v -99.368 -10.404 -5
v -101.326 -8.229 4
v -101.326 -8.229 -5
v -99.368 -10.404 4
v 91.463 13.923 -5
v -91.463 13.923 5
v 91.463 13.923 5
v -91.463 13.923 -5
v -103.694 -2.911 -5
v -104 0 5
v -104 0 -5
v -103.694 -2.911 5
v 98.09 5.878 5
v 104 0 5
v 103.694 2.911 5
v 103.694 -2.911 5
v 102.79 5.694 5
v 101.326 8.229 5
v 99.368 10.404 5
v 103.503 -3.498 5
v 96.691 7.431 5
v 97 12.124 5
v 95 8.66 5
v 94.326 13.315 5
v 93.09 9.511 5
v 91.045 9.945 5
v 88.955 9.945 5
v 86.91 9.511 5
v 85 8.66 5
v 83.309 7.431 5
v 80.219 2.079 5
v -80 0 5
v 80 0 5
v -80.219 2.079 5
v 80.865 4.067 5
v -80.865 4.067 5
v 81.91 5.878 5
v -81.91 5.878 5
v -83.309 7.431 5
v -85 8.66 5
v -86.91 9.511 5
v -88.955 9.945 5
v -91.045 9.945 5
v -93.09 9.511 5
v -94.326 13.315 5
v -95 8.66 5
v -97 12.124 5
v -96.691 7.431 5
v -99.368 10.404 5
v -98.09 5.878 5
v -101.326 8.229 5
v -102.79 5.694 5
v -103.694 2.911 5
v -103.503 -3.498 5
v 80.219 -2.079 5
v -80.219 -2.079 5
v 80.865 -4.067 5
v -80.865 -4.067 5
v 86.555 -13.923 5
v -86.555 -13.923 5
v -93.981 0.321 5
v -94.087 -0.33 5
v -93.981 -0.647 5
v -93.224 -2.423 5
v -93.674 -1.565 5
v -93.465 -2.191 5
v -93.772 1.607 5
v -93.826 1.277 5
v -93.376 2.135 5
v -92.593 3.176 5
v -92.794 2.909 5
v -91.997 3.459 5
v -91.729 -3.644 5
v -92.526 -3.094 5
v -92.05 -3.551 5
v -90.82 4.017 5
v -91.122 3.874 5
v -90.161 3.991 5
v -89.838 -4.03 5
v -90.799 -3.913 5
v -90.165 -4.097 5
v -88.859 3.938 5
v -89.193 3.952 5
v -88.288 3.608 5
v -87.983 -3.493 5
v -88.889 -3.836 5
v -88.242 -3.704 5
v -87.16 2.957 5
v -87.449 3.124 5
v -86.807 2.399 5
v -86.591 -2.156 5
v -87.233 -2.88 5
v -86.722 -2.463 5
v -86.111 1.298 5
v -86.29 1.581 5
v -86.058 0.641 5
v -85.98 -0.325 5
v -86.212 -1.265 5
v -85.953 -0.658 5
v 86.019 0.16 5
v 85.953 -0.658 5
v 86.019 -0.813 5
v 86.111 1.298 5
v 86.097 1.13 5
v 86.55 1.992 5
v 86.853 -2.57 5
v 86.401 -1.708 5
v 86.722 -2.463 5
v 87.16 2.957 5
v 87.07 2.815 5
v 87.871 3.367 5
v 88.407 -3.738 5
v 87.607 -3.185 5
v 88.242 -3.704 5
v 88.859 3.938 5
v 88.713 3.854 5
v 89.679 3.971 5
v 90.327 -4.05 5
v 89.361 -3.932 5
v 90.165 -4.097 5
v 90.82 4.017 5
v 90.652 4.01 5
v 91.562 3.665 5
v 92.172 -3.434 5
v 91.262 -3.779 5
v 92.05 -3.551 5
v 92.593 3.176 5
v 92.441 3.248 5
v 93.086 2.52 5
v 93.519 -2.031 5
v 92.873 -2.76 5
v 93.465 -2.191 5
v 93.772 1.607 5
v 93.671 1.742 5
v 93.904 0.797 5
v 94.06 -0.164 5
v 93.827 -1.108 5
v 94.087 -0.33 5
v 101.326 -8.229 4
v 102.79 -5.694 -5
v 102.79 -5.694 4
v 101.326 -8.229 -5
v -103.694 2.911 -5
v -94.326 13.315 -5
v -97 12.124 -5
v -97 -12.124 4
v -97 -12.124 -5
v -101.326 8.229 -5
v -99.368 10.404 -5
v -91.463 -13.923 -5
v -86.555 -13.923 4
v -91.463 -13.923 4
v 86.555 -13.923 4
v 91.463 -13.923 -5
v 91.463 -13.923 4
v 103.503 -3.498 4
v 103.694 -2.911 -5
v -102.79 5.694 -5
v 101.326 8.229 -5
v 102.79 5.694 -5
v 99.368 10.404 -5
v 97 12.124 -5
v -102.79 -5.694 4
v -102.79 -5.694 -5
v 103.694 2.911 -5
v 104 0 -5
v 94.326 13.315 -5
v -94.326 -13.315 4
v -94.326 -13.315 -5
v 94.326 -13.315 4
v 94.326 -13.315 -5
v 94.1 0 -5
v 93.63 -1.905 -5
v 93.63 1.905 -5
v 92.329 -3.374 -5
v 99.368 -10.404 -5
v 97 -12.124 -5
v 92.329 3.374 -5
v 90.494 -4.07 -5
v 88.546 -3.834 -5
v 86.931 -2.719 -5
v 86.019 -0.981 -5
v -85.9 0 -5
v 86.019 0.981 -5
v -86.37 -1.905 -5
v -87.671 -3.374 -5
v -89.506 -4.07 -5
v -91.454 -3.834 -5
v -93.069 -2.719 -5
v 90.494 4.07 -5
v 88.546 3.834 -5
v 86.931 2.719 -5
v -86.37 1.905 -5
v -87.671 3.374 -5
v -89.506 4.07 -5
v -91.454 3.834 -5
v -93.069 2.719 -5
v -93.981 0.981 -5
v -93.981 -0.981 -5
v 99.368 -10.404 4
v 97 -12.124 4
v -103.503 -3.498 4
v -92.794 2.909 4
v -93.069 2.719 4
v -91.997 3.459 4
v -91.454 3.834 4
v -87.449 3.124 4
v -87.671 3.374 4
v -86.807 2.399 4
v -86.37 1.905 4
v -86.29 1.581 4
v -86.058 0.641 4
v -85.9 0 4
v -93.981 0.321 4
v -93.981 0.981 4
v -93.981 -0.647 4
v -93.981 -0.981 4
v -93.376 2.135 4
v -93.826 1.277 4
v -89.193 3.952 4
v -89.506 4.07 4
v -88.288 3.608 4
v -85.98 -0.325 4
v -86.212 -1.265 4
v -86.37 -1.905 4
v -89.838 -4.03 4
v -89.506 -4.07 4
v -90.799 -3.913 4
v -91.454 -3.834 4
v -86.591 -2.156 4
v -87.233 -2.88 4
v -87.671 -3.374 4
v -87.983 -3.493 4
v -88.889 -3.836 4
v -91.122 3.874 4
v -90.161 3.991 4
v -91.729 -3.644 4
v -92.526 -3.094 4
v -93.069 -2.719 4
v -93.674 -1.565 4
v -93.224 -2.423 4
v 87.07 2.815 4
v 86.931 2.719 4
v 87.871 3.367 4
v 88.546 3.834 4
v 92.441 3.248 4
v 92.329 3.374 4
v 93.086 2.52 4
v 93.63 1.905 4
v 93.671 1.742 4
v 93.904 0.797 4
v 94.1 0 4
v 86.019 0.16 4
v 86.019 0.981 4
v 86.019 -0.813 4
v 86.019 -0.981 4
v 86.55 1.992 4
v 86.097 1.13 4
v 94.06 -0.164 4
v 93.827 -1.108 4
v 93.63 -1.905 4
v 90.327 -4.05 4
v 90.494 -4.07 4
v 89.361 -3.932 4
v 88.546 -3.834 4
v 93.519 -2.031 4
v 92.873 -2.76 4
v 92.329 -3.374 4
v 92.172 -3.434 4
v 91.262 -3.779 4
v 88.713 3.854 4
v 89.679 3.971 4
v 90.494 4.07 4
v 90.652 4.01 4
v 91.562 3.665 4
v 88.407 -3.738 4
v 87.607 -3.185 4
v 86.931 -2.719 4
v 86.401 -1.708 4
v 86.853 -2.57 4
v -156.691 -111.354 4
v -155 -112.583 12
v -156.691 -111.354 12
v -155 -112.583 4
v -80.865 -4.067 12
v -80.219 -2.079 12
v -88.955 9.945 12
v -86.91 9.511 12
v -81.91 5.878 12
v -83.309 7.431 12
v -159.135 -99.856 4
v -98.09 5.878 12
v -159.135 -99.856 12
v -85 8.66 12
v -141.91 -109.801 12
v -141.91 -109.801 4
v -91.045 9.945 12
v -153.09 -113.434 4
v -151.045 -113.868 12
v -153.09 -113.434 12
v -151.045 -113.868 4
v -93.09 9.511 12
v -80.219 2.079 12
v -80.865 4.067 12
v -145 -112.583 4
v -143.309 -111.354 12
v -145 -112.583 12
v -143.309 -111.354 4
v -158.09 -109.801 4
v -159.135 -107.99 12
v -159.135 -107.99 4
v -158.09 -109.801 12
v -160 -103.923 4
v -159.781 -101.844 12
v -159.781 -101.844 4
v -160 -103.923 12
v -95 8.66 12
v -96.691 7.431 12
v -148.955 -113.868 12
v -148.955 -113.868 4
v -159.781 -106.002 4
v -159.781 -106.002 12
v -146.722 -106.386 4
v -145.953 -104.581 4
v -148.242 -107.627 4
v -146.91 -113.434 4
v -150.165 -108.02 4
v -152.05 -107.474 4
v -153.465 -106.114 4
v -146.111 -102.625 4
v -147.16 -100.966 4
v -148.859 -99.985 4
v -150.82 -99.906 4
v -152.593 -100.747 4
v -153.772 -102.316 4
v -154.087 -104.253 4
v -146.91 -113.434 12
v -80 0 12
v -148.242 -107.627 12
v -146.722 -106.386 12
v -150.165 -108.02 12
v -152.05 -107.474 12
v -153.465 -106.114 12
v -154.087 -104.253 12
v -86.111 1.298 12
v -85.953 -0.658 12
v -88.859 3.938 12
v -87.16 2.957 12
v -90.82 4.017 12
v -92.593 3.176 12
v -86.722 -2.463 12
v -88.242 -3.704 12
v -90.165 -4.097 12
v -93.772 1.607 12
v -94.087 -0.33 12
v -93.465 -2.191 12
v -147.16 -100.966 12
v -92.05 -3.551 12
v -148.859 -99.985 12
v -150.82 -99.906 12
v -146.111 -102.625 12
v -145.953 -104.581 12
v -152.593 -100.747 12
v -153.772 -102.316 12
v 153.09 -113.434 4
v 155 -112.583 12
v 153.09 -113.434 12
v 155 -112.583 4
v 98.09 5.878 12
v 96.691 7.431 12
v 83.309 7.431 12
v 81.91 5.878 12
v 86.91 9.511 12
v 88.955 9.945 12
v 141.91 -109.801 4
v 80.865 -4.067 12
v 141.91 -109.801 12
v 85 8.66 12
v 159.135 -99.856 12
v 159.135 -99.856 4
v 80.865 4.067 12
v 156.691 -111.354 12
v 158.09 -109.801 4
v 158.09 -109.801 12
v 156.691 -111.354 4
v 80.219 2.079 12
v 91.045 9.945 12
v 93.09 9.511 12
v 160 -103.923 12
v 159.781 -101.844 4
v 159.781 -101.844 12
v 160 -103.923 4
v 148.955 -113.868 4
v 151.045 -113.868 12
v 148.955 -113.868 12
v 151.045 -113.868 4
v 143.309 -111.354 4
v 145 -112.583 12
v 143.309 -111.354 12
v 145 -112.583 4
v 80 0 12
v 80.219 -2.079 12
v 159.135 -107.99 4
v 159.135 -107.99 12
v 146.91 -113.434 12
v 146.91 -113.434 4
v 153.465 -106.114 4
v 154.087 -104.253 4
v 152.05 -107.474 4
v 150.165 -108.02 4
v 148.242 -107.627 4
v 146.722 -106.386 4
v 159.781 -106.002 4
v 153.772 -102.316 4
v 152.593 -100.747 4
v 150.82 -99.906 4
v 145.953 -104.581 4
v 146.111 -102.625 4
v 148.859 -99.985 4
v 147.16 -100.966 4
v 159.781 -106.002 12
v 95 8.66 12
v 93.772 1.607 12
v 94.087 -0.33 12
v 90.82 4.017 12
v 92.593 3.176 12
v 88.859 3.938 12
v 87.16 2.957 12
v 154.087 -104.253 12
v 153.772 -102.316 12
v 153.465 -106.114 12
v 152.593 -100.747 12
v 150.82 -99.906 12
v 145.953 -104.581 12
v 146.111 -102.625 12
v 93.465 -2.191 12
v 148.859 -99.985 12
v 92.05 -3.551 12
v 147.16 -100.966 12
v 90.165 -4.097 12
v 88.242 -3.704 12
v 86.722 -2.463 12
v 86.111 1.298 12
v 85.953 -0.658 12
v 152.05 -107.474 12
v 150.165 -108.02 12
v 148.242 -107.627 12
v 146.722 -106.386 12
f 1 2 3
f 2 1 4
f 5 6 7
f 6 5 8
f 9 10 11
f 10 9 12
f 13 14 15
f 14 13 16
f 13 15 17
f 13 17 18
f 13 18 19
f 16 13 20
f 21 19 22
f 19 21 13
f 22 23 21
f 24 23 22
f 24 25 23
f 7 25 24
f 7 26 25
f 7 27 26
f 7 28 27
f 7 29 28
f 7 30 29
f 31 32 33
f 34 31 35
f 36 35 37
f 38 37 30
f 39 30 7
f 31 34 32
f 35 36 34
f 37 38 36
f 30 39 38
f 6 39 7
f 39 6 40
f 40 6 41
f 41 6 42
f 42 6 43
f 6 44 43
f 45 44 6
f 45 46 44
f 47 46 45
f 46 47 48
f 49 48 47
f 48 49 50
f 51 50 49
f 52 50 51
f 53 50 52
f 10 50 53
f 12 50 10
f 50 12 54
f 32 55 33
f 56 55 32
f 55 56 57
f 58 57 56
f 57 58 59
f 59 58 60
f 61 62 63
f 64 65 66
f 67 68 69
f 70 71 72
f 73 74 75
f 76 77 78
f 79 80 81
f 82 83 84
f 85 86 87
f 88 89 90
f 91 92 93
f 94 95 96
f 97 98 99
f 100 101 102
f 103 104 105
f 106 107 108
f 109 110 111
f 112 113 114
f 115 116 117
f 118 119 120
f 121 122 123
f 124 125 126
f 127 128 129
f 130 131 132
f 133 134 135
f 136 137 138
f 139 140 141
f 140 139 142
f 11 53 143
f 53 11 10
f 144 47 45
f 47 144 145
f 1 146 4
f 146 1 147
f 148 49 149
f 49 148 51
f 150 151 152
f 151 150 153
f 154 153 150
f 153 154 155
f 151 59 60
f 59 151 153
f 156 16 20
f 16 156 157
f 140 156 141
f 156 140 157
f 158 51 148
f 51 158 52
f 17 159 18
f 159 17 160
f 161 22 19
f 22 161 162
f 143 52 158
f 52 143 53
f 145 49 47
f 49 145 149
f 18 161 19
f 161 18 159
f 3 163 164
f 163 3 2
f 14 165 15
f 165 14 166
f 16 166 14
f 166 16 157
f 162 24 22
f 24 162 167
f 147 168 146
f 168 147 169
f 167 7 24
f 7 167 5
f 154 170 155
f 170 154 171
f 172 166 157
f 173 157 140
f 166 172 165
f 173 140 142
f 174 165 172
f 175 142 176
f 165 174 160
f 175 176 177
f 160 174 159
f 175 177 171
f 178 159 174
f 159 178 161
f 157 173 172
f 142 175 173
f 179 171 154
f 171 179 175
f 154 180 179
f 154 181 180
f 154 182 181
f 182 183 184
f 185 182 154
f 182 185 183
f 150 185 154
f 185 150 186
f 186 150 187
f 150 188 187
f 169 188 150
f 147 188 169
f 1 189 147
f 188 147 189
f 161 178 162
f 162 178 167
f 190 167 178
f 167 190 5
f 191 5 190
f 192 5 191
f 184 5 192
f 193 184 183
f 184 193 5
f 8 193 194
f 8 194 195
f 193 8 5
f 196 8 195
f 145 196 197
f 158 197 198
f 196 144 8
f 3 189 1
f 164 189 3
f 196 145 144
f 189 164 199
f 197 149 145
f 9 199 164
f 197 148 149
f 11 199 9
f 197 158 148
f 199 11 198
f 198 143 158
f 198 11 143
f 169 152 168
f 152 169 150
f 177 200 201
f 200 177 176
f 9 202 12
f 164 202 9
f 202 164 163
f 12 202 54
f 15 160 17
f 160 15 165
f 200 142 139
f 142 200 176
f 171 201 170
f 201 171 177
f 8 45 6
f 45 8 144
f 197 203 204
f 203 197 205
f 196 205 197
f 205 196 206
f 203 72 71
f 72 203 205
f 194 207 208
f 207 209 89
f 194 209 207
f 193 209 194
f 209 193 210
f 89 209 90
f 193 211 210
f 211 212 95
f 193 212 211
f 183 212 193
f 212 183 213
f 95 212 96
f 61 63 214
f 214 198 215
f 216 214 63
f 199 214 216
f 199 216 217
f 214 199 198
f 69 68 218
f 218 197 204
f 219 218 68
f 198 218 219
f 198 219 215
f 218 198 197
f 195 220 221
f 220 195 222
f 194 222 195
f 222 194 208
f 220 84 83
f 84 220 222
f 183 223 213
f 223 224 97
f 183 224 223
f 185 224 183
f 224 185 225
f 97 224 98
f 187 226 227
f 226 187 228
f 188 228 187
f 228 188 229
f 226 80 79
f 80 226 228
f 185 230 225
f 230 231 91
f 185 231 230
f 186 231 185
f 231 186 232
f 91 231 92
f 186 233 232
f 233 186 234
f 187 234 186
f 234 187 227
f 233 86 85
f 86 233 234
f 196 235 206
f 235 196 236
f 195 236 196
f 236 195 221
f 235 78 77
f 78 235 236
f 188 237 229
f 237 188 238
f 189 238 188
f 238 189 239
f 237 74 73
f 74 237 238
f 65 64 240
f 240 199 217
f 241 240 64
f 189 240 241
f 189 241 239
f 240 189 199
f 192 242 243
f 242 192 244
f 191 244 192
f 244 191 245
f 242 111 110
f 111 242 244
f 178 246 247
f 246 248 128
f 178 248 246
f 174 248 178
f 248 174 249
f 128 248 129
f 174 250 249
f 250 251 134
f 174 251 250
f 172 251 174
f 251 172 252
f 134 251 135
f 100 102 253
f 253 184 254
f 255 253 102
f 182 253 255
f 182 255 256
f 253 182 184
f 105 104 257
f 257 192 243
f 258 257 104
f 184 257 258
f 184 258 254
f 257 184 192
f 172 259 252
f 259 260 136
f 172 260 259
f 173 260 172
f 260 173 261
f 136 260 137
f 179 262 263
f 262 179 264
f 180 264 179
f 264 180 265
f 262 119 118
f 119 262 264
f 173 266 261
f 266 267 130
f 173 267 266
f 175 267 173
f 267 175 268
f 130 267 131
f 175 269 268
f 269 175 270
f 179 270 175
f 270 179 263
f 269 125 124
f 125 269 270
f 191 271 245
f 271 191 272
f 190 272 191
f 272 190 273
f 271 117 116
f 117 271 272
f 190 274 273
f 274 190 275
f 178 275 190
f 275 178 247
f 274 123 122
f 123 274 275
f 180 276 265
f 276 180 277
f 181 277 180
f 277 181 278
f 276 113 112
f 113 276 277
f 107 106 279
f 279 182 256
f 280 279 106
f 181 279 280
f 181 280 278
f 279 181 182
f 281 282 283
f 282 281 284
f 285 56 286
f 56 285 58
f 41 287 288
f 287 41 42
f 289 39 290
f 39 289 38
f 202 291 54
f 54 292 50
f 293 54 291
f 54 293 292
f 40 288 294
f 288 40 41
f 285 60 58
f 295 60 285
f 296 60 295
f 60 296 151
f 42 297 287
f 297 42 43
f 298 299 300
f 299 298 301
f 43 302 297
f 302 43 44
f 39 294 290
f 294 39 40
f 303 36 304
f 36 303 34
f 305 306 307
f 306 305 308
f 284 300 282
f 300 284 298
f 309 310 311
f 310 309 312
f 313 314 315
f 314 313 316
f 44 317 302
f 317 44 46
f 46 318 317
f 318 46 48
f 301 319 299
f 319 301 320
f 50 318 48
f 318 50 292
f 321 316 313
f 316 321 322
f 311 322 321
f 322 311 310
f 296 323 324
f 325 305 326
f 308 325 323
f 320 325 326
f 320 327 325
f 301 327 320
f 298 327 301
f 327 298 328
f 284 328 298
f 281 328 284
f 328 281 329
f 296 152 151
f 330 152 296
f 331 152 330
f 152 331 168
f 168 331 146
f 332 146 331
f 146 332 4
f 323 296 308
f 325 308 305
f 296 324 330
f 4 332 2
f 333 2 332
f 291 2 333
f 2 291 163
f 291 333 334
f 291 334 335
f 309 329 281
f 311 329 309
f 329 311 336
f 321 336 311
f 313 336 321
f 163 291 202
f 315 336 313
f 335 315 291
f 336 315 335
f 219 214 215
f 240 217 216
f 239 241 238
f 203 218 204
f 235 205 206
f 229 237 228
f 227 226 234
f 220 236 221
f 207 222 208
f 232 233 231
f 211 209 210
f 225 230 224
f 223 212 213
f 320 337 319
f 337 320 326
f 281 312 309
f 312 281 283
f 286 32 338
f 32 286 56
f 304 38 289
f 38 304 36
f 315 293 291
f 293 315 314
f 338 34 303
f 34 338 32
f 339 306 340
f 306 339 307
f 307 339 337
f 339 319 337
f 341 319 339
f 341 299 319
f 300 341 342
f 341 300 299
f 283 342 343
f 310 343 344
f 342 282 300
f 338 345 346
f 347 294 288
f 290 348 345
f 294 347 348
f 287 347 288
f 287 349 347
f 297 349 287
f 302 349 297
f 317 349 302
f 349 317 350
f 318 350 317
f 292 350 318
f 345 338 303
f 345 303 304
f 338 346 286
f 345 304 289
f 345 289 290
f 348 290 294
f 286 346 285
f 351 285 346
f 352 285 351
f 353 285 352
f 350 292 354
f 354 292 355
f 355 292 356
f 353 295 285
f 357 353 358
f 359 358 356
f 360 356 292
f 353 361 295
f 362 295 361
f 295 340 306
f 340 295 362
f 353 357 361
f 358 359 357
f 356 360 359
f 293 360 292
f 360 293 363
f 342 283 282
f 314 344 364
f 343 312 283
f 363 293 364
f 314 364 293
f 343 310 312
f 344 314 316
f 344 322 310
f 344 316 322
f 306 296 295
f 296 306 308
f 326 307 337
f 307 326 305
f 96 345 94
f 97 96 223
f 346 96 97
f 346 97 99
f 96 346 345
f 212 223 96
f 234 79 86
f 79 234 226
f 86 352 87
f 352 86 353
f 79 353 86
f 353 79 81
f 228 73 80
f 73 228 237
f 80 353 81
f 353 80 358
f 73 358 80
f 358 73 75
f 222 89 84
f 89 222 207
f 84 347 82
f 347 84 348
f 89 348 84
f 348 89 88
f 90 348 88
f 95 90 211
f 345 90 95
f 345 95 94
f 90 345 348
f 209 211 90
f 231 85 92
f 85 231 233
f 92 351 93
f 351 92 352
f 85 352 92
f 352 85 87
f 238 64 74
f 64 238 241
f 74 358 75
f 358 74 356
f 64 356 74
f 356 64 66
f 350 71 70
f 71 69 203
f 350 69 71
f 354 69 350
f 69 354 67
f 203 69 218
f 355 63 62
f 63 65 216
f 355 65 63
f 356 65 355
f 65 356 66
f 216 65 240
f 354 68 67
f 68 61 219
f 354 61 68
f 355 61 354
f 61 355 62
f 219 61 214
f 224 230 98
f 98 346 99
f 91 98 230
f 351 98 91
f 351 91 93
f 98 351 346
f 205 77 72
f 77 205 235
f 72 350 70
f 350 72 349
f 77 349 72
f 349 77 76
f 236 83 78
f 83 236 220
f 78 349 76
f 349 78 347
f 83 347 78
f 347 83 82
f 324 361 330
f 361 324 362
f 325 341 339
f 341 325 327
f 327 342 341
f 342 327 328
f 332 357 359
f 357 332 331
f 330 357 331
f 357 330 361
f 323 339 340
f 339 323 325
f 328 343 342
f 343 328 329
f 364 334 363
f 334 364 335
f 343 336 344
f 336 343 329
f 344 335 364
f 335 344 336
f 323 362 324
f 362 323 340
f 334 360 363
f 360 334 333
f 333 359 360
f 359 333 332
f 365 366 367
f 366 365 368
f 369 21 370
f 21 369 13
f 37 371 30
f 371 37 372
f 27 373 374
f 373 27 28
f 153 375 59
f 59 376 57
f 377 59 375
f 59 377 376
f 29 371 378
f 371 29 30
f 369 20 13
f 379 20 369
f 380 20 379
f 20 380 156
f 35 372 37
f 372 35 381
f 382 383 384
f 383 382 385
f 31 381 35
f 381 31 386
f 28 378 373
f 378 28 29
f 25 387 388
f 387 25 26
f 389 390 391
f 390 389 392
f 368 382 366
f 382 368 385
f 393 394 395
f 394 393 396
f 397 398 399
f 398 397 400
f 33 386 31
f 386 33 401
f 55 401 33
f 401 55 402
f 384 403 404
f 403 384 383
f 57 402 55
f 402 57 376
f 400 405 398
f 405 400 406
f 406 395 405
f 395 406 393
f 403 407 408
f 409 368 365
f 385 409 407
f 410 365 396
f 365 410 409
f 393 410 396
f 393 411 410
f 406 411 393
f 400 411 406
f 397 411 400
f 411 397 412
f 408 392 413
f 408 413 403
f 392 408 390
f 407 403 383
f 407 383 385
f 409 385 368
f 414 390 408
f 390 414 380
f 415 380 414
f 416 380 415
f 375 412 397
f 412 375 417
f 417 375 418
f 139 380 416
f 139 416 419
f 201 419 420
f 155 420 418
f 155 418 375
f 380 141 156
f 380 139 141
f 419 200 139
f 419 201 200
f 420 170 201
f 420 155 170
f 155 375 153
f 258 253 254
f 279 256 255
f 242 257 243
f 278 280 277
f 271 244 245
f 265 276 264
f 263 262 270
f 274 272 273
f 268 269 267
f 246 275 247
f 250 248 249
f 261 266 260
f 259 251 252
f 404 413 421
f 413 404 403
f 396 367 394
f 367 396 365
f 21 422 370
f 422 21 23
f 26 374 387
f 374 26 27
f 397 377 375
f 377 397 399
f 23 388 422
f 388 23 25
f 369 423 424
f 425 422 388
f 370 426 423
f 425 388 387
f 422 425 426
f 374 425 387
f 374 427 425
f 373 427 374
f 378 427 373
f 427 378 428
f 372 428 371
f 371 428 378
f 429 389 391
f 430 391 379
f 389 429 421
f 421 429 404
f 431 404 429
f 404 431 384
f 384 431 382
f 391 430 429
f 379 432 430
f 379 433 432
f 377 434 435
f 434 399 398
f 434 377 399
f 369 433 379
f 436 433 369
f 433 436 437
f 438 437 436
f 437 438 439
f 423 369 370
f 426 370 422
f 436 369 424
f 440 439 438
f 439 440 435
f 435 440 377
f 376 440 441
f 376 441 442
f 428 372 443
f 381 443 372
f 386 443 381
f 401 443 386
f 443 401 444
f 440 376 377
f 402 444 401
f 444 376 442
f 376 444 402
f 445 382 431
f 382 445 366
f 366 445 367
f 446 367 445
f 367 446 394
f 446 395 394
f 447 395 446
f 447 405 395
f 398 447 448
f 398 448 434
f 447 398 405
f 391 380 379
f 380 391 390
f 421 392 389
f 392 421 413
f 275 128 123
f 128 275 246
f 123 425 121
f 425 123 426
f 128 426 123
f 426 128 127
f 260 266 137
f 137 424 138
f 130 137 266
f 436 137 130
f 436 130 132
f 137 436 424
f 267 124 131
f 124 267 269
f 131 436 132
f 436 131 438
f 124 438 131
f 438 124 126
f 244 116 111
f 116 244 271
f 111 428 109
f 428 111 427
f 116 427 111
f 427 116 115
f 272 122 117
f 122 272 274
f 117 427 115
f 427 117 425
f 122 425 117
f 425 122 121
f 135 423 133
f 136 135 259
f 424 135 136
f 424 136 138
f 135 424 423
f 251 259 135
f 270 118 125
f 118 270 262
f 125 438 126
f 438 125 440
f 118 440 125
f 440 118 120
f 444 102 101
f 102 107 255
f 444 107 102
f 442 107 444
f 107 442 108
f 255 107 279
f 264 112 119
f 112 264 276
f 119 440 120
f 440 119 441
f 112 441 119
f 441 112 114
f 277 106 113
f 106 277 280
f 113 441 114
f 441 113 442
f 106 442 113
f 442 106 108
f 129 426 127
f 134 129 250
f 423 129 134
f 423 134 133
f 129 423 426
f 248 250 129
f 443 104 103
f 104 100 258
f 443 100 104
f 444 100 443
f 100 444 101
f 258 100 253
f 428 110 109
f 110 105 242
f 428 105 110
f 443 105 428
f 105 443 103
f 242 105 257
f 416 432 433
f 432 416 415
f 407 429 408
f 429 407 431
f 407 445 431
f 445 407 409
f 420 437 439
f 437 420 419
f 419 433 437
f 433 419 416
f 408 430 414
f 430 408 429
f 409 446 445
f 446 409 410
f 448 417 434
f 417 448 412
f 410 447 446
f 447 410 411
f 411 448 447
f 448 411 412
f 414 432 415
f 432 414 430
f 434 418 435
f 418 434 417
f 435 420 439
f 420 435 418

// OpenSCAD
// Hanging planar five-bar — Week 1–3 kinematic sketch (mm)
// Not a final print file. GSM is omitted.
// Ground on top. Open in OpenSCAD, F5 preview, F6 render.

d = 180.0;
l1 = 120.0;
l2 = l1;
l3 = 180.0;
l4 = l3;
w  = 20.0;
t  = 8.0;
hole = 8.2;

module link(len) {
    difference() {
        hull() {
            translate([0,0,0]) cylinder(h=t, d=w, center=true);
            translate([len,0,0]) cylinder(h=t, d=w, center=true);
        }
        translate([0,0,0]) cylinder(h=t+2, d=hole, center=true);
        translate([len,0,0]) cylinder(h=t+2, d=hole, center=true);
    }
}

module ground() {
    difference() {
        hull() {
            translate([-d/2,0,0]) cylinder(h=t+2, d=w+8, center=true);
            translate([ d/2,0,0]) cylinder(h=t+2, d=w+8, center=true);
        }
        translate([-d/2,0,0]) cylinder(h=t+6, d=hole, center=true);
        translate([ d/2,0,0]) cylinder(h=t+6, d=hole, center=true);
    }
}

// Preview pose: left/right cranks at sample IK (approx.)
theta_L = -120.0; // replace after Week 1–3 IK script
theta_R = 180 - theta_L;

color("dimgray") ground();
translate([-d/2,0,t]) rotate([0,0,theta_L]) color("steelblue") link(l1);
translate([ d/2,0,t]) rotate([0,0,theta_R]) color("steelblue") link(l2);
// Couplers are left as separate parts for the student to assemble after IK is coded.
